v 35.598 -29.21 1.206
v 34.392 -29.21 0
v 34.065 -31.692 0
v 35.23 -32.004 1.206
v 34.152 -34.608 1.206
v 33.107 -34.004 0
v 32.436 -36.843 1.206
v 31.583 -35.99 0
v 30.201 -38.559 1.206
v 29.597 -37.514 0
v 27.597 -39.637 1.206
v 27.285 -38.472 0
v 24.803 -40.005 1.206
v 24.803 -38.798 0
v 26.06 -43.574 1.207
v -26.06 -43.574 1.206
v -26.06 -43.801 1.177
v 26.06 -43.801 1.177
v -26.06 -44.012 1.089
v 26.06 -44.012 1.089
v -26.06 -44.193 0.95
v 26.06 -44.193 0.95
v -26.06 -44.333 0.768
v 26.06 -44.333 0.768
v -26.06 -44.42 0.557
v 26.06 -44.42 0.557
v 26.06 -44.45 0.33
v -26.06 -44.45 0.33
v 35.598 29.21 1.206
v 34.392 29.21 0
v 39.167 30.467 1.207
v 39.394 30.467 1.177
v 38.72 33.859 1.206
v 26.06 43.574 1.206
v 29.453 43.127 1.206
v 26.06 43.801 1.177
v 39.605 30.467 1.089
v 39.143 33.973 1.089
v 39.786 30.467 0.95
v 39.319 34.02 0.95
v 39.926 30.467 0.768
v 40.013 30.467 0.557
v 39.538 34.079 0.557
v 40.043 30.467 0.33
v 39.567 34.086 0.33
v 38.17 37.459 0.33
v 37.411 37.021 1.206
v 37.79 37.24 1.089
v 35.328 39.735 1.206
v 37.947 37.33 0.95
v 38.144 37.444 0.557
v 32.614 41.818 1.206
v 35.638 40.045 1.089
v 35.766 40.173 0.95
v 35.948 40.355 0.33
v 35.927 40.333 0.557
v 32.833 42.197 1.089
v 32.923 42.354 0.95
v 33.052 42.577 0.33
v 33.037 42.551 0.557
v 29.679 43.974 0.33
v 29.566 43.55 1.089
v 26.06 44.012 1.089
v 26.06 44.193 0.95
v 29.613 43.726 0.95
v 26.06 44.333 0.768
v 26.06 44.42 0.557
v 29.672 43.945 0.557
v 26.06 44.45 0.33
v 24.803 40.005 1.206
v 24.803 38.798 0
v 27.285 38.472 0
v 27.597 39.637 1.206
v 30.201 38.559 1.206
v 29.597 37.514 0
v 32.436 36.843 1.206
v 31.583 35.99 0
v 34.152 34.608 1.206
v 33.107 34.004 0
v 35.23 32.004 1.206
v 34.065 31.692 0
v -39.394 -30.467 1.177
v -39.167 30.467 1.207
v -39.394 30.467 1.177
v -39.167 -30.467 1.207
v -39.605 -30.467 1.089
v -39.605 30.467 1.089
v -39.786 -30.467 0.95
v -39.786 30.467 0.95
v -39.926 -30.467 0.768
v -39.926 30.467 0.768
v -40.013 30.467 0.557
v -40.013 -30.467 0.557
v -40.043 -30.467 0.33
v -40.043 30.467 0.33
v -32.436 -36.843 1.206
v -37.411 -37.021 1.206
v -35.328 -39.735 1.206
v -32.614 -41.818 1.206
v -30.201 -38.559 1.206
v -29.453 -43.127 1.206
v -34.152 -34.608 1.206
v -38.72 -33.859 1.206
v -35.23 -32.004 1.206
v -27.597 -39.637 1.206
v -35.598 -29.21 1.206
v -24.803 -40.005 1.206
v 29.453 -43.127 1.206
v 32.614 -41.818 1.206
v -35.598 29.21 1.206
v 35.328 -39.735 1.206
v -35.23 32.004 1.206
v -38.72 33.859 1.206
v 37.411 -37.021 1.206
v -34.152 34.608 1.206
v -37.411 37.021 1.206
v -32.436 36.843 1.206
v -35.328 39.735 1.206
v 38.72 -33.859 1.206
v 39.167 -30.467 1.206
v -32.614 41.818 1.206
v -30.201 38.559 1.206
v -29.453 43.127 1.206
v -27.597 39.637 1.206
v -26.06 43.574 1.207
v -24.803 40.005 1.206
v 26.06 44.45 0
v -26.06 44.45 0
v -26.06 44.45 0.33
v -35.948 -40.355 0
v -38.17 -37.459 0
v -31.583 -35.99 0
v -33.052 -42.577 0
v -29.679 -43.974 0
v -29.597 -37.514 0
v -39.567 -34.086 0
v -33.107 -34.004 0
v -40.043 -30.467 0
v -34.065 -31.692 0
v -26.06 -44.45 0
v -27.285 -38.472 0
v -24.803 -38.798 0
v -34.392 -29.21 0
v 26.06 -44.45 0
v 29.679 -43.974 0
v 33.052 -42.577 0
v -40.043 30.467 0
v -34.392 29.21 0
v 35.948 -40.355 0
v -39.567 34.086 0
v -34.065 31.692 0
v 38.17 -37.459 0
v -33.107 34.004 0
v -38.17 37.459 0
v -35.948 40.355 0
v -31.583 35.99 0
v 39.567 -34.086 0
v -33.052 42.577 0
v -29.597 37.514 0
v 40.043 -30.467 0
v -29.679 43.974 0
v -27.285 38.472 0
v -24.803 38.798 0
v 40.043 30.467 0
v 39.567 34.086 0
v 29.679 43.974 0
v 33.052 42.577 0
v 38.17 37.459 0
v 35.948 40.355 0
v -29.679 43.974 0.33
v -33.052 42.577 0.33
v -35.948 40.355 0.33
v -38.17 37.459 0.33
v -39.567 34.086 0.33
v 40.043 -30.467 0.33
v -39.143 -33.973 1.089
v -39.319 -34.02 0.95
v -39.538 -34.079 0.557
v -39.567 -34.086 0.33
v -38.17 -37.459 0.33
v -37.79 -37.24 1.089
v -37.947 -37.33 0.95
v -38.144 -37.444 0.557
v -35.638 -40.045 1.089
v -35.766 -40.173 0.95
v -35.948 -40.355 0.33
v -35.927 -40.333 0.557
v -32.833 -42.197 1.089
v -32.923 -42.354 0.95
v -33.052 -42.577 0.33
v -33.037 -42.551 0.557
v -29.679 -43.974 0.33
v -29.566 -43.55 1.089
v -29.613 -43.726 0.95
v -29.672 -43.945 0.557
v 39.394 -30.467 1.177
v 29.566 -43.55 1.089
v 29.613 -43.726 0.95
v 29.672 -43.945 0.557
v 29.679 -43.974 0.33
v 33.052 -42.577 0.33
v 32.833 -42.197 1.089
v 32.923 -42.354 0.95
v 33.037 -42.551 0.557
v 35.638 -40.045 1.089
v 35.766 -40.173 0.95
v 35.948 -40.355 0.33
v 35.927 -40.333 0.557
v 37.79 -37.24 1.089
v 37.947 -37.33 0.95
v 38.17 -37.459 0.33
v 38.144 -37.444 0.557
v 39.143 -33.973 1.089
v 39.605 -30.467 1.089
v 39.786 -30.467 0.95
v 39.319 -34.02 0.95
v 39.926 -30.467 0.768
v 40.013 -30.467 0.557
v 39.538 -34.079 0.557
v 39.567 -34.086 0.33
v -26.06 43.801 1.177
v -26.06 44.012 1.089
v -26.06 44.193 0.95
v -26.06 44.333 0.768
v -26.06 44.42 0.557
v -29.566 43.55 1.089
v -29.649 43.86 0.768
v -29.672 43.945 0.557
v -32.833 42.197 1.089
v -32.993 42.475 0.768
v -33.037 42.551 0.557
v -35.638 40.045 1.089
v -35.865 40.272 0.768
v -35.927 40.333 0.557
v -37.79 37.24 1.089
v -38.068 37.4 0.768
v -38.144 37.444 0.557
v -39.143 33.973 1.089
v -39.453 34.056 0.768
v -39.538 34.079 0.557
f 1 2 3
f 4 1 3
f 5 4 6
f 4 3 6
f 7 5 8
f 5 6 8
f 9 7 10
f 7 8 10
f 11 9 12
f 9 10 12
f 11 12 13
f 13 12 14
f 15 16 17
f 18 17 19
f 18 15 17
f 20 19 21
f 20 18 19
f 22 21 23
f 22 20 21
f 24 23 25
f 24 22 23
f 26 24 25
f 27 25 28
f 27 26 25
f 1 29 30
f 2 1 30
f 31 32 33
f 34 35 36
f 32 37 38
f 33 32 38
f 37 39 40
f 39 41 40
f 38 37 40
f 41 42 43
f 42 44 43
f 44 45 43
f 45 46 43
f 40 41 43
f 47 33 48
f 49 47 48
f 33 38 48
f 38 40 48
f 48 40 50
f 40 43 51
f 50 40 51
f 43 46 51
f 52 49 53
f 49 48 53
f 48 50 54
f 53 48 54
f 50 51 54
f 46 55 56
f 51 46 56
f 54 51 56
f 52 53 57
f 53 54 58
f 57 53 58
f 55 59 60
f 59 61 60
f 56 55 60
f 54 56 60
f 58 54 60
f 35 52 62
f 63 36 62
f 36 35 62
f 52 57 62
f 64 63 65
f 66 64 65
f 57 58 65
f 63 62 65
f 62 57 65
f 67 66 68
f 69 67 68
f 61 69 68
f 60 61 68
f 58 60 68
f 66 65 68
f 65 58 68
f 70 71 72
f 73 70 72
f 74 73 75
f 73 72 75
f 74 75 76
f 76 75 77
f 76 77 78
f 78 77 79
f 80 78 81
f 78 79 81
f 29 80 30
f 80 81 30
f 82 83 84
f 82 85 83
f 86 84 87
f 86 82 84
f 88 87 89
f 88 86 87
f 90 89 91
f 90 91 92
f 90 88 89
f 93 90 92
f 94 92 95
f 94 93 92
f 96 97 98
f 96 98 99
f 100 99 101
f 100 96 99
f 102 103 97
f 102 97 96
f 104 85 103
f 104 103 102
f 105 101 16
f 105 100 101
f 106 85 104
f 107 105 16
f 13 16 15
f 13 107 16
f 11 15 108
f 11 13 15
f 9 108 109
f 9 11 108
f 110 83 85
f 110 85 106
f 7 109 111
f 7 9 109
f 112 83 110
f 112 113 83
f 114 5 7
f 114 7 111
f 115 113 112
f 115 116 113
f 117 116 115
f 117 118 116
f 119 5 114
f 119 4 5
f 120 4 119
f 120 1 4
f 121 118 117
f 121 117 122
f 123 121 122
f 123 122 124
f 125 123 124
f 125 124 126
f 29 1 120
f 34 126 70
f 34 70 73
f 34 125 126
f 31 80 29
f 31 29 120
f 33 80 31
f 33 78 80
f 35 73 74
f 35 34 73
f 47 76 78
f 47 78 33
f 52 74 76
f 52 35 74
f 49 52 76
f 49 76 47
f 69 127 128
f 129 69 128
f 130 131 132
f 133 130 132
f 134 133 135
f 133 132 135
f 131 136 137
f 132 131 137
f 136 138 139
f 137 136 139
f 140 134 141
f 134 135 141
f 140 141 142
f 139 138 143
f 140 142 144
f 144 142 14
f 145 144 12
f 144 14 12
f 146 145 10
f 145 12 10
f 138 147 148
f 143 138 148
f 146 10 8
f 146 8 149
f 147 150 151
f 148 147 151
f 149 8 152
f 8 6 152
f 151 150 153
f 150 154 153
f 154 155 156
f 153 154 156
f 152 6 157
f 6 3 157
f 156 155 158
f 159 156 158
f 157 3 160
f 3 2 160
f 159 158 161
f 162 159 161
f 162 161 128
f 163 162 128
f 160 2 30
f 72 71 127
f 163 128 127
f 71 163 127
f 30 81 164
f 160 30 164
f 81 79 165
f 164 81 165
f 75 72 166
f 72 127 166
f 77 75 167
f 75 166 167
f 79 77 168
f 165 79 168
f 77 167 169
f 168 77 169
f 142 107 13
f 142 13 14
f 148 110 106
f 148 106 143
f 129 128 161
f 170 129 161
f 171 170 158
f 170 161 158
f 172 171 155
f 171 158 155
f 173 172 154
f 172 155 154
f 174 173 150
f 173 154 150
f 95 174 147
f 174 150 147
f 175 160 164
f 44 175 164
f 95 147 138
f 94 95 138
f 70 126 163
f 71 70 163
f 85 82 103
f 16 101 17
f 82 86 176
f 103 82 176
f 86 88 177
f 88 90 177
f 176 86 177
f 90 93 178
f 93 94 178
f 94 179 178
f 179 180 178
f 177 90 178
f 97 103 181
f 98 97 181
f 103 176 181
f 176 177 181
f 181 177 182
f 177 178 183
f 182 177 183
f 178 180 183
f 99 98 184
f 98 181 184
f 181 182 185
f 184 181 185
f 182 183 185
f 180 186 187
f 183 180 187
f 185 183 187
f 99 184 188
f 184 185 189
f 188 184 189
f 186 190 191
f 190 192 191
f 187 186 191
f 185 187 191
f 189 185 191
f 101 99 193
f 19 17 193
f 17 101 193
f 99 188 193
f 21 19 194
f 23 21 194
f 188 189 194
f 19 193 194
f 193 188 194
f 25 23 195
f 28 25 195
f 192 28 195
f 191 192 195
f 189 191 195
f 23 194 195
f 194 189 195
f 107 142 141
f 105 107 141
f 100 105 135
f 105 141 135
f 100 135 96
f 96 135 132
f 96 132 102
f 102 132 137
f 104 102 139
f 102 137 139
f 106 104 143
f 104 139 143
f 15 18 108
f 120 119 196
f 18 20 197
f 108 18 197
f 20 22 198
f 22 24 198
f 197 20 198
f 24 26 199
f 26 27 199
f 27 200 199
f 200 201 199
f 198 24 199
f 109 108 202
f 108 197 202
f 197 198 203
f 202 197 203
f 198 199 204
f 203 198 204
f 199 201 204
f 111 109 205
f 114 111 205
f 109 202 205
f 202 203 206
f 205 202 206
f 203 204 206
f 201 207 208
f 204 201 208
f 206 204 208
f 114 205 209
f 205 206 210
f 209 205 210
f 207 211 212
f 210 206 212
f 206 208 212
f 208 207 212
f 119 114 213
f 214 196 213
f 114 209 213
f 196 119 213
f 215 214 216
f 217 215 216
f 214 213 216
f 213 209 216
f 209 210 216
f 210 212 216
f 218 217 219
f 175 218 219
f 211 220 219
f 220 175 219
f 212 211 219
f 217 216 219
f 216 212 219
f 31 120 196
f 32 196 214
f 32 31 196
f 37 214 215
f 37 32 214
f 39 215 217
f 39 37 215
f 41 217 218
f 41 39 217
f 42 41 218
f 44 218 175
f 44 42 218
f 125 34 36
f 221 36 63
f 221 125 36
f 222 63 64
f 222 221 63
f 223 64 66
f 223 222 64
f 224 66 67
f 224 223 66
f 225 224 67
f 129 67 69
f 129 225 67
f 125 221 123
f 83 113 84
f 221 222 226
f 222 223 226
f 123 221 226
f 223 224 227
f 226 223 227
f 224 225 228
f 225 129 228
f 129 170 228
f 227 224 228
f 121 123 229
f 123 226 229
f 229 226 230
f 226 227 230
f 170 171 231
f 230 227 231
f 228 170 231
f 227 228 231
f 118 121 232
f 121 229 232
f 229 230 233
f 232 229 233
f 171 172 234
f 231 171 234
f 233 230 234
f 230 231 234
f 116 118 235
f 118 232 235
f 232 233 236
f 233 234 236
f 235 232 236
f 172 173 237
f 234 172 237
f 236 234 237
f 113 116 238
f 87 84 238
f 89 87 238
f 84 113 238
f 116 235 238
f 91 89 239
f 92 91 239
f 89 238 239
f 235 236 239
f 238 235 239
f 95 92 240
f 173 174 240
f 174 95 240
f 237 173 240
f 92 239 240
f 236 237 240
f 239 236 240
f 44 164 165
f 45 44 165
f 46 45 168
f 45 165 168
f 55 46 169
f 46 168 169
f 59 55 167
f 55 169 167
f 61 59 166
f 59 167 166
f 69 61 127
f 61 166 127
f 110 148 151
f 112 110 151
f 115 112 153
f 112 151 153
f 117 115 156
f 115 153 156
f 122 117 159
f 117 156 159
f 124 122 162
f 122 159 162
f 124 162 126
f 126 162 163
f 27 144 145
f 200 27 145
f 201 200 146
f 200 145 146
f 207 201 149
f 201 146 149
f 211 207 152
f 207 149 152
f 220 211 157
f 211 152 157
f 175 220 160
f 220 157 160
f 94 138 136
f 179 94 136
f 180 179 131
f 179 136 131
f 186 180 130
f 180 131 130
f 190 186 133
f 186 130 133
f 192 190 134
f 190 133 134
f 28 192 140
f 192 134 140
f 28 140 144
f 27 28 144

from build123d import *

# Parameters (mm, degrees)
F2_DEPTH     = 1.2065
F3_DEPTH     = 1.2075
F4_R         = 0.8763
F5_T1_DEPTH  = 58.42
F5_T3_DEPTH  = 49.6062
F5_T6_ANGLE  = 90
F5_T8_ANGLE  = 90
F5_T10_ANGLE = 90
F5_T12_ANGLE = 90


# Not quite as in the source:
# - a fillet or chamfer that OpenCascade refuses, or shapes differently, is made with other operations: its cross-section is extruded or revolved along the edge and cut away or added


with BuildPart() as f2:
    # F0 (on Top) → F2 (new body)
    with BuildSketch(Plane.XY):
        with BuildLine():
            ThreePointArc((40.0431, 30.4673), (35.9476619893, 40.3545619893), (26.0604, 44.45))
            Line((26.0604, 44.45), (-26.0604, 44.45))
            ThreePointArc((-26.0604, 44.45), (-35.9476619893, 40.3545619893), (-40.0431, 30.4673))
            Line((-40.0431, 30.4673), (-40.0431, -30.4673))
            ThreePointArc((-40.0431, -30.4673), (-35.9476619893, -40.3545619893), (-26.0604, -44.45))
            Line((-26.0604, -44.45), (26.0604, -44.45))
            ThreePointArc((26.0604, -44.45), (35.9476619893, -40.3545619893), (40.0431, -30.4673))
            Line((40.0431, -30.4673), (40.0431, 30.4673))
        make_face()
    extrude(amount=F2_DEPTH)

    # F1 (on Top) + F2_face (on face) → F3 (cut, through all)
    with BuildSketch(Plane.XY):
        with BuildLine():
            ThreePointArc((34.3281, 29.21), (31.5382920908, 35.9451920908), (24.8031, 38.735))
            Line((24.8031, 38.735), (-24.8031, 38.735))
            ThreePointArc((-24.8031, 38.735), (-31.5382920908, 35.9451920908), (-34.3281, 29.21))
            Line((-34.3281, 29.21), (-34.3281, -29.21))
            ThreePointArc((-34.3281, -29.21), (-31.5382920908, -35.9451920908), (-24.8031, -38.735))
            Line((-24.8031, -38.735), (24.8031, -38.735))
            ThreePointArc((24.8031, -38.735), (31.5382920908, -35.9451920908), (34.3281, -29.21))
            Line((34.3281, -29.21), (34.3281, 29.21))
        make_face()
    with BuildSketch(Plane.XY.offset(1.2065)):
        with BuildLine():
            ThreePointArc((40.0431, 30.4673), (35.9476619893, 40.3545619893), (26.0604, 44.45))
            Line((26.0604, 44.45), (-26.0604, 44.45))
            ThreePointArc((-26.0604, 44.45), (-35.9476619893, 40.3545619893), (-40.0431, 30.4673))
            Line((-40.0431, 30.4673), (-40.0431, -30.4673))
            ThreePointArc((-40.0431, -30.4673), (-35.9476619893, -40.3545619893), (-26.0604, -44.45))
            Line((-26.0604, -44.45), (26.0604, -44.45))
            ThreePointArc((26.0604, -44.45), (35.9476619893, -40.3545619893), (40.0431, -30.4673))
            Line((40.0431, -30.4673), (40.0431, 30.4673))
        make_face()
    extrude(amount=F3_DEPTH, mode=Mode.SUBTRACT)

    # F4
    f4_edges = [f2.edges().sort_by_distance(p)[0] for p in [
        (-40.0431, 0, 1.2065),
    ]]
    fillet(f4_edges, radius=F4_R)

    # F5: chamfer of 1.27 on 1 edges, made by hand

    # F5_s2 → F5_t1 (cut)
    with BuildSketch(Plane.XZ.offset(-29.21)):
        Polygon((-35.5981, 1.2065), (-34.3281, -0.0635), (-34.3281, 1.2065), align=None)
        Polygon((35.5981, 1.2065), (34.3281, -0.0635), (34.3281, 1.2065), align=None)
    extrude(amount=F5_T1_DEPTH, mode=Mode.SUBTRACT)

    # F5_s4 → F5_t3 (cut)
    with BuildSketch(Plane.YZ.offset(-24.8031)):
        Polygon((-40.005, 1.2065), (-38.735, -0.0635), (-38.735, 1.2065), align=None)
        Polygon((40.005, 1.2065), (38.735, -0.0635), (38.735, 1.2065), align=None)
    extrude(amount=F5_T3_DEPTH, mode=Mode.SUBTRACT)

    # F5_s5 → F5_t6 (revolve, cut)
    with BuildSketch(Plane.XZ.offset(-29.21)):
        Polygon((-35.5981, 1.2065), (-34.3281, -0.0635), (-34.3281, 1.2065), align=None)
    revolve(axis=Axis((-24.8031, 29.21, 1.2065), (0, 0, -1)), revolution_arc=F5_T6_ANGLE, mode=Mode.SUBTRACT)

    # F5_s7 → F5_t8 (revolve, cut)
    with BuildSketch(Plane.YZ.offset(-24.8031)):
        Polygon((-40.005, 1.2065), (-38.735, -0.0635), (-38.735, 1.2065), align=None)
    revolve(axis=Axis((-24.8031, -29.21, 1.2065), (0, 0, -1)), revolution_arc=F5_T8_ANGLE, mode=Mode.SUBTRACT)

    # F5_s9 → F5_t10 (revolve, cut)
    with BuildSketch(Plane.XZ.offset(29.21)):
        Polygon((35.5981, 1.2065), (34.3281, -0.0635), (34.3281, 1.2065), align=None)
    revolve(axis=Axis((24.8031, -29.21, 1.2065), (0, 0, -1)), revolution_arc=F5_T10_ANGLE, mode=Mode.SUBTRACT)

    # F5_s11 → F5_t12 (revolve, cut)
    with BuildSketch(Plane.YZ.offset(24.8031)):
        Polygon((40.005, 1.2065), (38.735, -0.0635), (38.735, 1.2065), align=None)
    revolve(axis=Axis((24.8031, 29.21, 1.2065), (0, 0, -1)), revolution_arc=F5_T12_ANGLE, mode=Mode.SUBTRACT)


solid = f2.part
